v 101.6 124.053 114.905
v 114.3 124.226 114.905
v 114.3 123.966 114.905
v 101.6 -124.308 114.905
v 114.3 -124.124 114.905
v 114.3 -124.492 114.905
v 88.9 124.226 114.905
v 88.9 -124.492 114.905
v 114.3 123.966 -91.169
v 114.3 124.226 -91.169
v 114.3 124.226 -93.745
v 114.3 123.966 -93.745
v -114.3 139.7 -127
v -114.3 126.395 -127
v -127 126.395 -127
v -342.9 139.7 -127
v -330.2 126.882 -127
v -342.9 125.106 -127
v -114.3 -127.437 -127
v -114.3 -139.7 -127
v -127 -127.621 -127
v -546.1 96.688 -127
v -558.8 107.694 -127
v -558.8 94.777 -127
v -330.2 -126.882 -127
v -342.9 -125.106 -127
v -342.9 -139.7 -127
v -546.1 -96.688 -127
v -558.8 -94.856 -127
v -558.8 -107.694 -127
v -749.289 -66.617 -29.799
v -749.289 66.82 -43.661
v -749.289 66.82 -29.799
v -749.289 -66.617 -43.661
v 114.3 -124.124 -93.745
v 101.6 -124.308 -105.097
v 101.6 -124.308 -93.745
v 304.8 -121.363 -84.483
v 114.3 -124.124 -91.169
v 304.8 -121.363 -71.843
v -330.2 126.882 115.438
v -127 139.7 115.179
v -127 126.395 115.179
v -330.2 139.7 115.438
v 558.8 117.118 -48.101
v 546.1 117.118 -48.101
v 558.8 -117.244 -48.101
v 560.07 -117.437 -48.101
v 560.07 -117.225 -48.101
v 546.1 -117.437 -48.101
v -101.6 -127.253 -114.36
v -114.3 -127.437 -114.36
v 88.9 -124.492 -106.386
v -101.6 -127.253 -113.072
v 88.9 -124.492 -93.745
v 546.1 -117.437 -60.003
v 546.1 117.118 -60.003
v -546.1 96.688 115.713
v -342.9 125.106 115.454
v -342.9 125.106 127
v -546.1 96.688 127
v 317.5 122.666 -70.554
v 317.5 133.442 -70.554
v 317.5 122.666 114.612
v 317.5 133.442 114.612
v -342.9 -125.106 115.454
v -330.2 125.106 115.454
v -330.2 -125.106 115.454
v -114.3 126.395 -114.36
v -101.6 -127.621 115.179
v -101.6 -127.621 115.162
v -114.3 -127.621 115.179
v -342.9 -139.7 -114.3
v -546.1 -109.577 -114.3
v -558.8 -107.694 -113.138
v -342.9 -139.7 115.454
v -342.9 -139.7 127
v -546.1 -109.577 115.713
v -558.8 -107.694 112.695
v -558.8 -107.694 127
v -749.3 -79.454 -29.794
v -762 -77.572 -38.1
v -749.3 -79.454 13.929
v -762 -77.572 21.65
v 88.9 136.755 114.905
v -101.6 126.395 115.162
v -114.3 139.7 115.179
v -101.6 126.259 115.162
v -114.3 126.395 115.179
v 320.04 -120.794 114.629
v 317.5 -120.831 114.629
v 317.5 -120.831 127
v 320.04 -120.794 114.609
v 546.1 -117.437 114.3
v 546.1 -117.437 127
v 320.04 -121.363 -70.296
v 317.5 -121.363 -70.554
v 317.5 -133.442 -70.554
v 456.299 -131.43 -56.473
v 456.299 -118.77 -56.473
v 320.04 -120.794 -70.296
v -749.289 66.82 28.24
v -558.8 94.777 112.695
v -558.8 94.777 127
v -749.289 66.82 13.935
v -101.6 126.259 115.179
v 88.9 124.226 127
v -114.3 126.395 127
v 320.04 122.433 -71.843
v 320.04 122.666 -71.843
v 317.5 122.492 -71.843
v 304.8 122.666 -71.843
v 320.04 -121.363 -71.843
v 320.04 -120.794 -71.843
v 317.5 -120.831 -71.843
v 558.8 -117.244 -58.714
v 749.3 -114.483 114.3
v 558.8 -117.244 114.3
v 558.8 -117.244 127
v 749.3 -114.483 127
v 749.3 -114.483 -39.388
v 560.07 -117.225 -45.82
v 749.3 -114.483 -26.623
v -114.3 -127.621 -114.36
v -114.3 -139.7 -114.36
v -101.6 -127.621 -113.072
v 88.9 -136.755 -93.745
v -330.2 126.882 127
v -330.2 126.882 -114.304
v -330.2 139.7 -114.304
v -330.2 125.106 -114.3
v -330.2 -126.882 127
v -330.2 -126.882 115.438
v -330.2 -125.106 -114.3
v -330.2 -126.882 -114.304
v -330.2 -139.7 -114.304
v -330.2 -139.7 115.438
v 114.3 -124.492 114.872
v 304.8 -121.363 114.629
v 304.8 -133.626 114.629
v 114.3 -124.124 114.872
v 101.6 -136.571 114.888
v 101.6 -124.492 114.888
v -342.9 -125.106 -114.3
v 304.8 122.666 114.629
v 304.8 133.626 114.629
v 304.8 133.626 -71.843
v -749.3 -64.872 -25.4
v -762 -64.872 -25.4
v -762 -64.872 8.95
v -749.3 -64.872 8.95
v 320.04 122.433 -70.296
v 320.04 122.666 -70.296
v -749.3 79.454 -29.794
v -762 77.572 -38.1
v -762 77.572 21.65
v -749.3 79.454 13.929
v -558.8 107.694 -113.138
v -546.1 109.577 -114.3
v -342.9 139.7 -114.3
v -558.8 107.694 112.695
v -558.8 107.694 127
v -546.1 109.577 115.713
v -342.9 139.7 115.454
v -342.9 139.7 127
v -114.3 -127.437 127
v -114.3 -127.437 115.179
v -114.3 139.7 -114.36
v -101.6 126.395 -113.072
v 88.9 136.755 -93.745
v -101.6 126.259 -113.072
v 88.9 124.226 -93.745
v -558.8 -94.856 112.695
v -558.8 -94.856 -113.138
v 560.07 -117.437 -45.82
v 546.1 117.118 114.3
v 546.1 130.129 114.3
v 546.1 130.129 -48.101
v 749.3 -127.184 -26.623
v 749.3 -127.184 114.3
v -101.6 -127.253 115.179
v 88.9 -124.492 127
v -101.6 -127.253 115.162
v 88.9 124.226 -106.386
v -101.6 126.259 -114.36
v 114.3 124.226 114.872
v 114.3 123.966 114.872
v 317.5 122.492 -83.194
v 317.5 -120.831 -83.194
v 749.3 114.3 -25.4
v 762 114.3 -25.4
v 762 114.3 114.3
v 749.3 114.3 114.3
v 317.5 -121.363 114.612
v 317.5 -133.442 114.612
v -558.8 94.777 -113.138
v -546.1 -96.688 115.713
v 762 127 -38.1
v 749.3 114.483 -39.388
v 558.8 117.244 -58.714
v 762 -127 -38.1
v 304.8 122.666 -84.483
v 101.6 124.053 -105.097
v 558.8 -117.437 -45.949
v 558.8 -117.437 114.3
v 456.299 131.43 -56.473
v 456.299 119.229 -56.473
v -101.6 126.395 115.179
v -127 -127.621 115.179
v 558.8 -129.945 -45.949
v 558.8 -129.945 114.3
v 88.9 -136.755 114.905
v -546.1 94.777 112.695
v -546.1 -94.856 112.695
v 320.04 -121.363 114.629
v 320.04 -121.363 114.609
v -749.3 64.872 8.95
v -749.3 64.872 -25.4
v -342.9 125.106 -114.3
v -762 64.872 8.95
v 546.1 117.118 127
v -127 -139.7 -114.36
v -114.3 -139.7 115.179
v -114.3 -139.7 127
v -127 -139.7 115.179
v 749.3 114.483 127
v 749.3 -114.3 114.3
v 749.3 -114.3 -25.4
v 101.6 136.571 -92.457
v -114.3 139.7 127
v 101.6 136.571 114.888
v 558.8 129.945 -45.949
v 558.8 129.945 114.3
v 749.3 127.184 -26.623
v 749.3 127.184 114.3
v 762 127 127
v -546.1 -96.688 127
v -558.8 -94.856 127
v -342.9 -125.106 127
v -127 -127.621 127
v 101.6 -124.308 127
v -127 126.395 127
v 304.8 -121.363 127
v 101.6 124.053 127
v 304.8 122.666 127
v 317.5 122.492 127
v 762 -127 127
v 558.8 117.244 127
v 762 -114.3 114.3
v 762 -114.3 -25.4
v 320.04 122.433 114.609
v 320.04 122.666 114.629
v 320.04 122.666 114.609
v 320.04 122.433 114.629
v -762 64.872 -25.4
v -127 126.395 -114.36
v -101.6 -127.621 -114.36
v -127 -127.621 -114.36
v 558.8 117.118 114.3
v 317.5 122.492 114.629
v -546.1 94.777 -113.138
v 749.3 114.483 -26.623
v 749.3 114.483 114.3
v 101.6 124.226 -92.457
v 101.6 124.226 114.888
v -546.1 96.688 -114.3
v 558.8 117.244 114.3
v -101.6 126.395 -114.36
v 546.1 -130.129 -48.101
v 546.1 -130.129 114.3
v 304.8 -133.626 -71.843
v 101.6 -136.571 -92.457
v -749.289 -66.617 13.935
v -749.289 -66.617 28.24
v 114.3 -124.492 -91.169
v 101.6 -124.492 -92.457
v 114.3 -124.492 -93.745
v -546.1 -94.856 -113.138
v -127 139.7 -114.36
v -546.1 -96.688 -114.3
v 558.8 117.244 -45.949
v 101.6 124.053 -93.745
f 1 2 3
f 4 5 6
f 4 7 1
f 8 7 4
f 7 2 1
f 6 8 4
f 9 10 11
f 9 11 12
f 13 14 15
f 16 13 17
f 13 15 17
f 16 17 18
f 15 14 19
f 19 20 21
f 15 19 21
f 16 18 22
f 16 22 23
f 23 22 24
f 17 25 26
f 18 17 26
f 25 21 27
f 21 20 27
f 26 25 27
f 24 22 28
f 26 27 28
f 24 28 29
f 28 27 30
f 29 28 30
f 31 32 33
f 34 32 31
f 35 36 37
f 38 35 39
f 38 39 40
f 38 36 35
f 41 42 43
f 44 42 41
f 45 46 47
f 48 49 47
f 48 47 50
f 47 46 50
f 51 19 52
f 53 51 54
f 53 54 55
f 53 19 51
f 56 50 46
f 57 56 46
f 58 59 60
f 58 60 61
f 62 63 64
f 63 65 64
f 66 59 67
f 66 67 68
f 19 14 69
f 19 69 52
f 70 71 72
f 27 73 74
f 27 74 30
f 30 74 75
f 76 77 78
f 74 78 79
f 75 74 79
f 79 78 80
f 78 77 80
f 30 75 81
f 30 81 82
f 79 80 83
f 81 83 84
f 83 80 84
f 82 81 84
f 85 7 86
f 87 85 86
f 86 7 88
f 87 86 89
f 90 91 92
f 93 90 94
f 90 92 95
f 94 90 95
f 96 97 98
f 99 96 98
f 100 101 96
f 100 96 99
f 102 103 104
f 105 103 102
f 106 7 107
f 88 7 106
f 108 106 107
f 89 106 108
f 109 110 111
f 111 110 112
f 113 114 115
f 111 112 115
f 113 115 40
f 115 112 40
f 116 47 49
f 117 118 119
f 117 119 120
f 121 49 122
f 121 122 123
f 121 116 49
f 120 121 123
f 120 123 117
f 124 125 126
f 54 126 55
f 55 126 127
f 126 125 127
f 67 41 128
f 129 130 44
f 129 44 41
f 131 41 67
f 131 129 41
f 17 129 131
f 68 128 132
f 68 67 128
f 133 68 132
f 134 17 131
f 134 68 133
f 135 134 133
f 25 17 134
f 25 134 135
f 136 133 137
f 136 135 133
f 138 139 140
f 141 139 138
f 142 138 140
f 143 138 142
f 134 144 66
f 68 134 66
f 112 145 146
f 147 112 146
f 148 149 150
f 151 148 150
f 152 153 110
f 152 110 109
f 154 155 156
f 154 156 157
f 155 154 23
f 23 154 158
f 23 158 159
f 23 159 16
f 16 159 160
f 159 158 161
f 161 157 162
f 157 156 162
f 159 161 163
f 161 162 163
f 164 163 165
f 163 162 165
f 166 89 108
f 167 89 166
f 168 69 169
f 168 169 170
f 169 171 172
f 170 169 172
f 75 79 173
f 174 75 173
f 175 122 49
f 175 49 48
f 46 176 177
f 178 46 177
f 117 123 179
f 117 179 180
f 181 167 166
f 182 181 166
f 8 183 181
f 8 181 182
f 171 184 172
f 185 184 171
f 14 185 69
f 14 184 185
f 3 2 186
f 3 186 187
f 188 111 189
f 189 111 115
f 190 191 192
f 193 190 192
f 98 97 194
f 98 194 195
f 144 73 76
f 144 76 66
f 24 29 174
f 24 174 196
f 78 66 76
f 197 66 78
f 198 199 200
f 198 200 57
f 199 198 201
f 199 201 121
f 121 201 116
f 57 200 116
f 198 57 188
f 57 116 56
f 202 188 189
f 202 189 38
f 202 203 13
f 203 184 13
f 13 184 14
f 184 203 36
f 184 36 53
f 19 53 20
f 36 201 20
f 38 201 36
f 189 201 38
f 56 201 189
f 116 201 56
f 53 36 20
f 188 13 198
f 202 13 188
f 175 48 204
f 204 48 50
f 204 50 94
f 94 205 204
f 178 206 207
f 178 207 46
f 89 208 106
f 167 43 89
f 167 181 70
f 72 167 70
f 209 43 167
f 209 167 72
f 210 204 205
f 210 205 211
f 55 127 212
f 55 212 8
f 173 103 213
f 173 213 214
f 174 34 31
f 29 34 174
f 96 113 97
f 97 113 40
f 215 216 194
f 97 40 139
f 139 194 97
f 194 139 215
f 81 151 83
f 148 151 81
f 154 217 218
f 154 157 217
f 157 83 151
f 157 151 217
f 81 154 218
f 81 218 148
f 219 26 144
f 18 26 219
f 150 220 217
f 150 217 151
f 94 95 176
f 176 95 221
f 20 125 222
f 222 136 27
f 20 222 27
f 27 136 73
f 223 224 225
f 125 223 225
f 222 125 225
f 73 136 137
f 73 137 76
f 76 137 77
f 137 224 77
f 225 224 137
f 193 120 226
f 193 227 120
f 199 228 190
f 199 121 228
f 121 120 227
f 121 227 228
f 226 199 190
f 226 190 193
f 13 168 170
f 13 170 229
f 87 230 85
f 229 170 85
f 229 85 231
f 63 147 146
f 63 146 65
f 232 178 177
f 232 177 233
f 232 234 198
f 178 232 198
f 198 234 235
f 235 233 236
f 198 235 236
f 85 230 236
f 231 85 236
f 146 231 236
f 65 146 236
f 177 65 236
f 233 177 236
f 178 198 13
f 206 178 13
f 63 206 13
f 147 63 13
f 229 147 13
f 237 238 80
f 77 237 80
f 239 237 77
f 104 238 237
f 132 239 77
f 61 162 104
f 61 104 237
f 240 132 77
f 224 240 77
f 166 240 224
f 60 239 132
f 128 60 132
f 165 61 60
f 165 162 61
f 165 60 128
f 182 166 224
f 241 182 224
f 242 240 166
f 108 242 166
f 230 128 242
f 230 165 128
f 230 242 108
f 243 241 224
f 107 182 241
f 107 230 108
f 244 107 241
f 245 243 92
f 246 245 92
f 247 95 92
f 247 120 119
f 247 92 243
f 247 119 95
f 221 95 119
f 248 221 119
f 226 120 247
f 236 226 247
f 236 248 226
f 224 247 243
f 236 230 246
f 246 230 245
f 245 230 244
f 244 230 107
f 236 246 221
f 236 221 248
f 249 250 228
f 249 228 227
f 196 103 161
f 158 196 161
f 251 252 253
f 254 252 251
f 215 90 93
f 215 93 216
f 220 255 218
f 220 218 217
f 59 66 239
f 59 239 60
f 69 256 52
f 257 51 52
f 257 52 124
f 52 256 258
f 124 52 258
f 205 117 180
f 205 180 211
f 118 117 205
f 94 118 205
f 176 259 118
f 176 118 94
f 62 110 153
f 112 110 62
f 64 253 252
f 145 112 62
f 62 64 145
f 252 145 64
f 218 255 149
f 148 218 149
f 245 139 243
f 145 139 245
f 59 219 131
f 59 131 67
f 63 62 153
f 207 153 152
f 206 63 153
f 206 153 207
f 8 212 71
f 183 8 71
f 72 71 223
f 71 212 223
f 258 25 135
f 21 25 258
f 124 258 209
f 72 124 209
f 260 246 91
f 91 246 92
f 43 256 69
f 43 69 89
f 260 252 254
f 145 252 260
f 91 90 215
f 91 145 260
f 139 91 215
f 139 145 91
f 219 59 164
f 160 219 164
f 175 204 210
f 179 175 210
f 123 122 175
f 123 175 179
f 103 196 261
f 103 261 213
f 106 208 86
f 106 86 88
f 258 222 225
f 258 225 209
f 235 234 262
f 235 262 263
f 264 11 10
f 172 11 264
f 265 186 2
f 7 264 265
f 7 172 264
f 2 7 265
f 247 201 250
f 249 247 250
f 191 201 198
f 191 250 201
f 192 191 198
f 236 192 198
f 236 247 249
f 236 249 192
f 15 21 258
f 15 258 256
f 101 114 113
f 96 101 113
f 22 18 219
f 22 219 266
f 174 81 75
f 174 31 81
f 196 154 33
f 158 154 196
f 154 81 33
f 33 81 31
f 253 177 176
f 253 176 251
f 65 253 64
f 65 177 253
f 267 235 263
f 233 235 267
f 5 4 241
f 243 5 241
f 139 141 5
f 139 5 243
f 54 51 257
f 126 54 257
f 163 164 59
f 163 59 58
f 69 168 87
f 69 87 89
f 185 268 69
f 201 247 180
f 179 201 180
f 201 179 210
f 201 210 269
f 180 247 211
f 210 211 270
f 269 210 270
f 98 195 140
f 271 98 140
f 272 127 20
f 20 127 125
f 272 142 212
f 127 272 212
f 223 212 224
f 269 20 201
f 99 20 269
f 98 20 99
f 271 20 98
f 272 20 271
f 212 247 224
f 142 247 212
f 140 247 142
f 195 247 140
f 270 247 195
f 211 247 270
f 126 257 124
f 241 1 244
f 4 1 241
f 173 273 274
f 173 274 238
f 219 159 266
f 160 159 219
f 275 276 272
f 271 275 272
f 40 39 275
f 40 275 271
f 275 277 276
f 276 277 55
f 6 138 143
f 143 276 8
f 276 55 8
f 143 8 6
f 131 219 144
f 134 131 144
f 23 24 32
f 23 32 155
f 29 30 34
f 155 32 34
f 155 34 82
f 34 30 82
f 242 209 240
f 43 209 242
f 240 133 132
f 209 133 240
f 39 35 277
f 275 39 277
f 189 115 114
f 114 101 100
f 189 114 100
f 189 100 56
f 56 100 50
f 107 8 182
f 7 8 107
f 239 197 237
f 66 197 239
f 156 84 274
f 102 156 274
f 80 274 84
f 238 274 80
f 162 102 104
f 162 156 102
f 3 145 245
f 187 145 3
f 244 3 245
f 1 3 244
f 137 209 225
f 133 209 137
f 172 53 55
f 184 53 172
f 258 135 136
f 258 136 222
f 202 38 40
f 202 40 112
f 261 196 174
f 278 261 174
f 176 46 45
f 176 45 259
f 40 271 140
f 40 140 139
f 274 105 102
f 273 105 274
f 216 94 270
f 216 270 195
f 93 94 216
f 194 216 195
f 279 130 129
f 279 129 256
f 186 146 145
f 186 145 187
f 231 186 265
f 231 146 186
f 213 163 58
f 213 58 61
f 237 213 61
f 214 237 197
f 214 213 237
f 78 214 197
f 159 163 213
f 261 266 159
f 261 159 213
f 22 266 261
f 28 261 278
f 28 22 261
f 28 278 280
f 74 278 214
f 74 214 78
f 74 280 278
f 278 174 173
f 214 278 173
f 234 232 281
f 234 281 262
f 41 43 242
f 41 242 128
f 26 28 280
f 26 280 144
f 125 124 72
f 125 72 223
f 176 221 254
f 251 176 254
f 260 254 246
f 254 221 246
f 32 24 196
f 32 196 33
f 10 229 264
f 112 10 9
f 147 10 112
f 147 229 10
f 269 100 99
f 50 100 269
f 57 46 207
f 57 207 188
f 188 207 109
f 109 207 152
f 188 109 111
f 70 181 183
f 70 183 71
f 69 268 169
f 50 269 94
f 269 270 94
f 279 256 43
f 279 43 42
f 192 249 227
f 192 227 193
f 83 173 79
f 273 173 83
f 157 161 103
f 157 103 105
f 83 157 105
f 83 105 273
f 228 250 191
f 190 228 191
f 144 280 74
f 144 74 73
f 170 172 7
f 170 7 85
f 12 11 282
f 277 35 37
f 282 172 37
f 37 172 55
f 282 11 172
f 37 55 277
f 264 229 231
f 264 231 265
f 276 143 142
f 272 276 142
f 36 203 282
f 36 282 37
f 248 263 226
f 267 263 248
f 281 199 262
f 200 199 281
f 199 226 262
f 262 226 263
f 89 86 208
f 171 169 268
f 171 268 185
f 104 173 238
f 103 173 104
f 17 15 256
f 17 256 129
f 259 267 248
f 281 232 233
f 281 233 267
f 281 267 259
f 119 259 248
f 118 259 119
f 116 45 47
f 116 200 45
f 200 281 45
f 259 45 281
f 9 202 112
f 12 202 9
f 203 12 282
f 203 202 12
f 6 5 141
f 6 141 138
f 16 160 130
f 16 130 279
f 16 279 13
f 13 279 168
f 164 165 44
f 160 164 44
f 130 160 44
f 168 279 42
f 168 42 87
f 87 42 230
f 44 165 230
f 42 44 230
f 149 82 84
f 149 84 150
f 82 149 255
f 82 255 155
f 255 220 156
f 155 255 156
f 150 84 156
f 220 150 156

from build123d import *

# Parameters (mm, degrees)
F0_W      = 1524
F0_H      = 355.6
F2_DEPTH  = 127
F5_W      = 12.7
F5_H      = 295.684620738
F6_DEPTH  = 177.8
F8_DEPTH  = 190.5
F9_W      = 1716.6963219643
F9_H      = 471.6365635395
F10_DEPTH = 190.5
F12_DEPTH = 190.5
F13_W     = 1570.3657865524
F13_H     = 143.7467932701
F14_DEPTH = 190.5
F15_W     = 189.6323112059
F15_H     = 225.8323701404
F16_DEPTH = 25.4
F17_W     = 250.2110230158
F17_H     = 229.754279344
F18_DEPTH = 25.4
F19_W     = 254.0152243916
F19_H     = 229.5392287665
F20_DEPTH = 25.4
F21_W     = 248.717826187
F21_H     = 208.6506967284
F22_DEPTH = 25.4
F23_W     = 244.0285278141
F23_H     = 186.4718558426
F24_DEPTH = 15.24
F25_W     = 234.5546834328
F25_H     = 162.4008728846
F26_DEPTH = 13.97
F28_W     = 129.7433354616
F28_H     = 34.350046491
F29_DEPTH = 25.4
F30_W     = 228.6
F30_H     = 139.7
F31_DEPTH = 12.7


# Not quite as in the source:
# - a feature names something its author has since deleted; it is built from what else it names


with BuildPart() as f2:
    # F0 (on Top) → F2 (new body, symmetric)
    with BuildSketch(Plane.XY):
        Rectangle(F0_W, F0_H)
    extrude(amount=F2_DEPTH, both=True)

    # F5 (on Front) → F6 (join, symmetric)
    with BuildSketch(Plane.XZ):
        with Locations((-552.45, 4.7732368112)):
            Rectangle(F5_W, F5_H)
        with Locations((-336.55, 4.7732368112)):
            Rectangle(F5_W, F5_H)
        with Locations((-120.65, 4.7732368112)):
            Rectangle(F5_W, F5_H)
        with Locations((95.25, 4.7732368112)):
            Rectangle(F5_W, F5_H)
        with Locations((552.45, 4.7732368112)):
            Rectangle(F5_W, F5_H)
        with Locations((311.15, 4.7732368112)):
            Rectangle(F5_W, F5_H)
    extrude(amount=F6_DEPTH, both=True)

    # F7 (on Front) → F8 (cut, symmetric)
    with BuildSketch(Plane.XZ):
        Polygon((-1015.0121382617, 307.3465449898), (-843.425049348, -20.5651363992), (-558.8, 127), align=None)
        Polygon((-558.8, -127), (-762, -38.1), (-810.4430437088, -38.1), (-810.4430437088, -218.054279685), (819.7100162506, -218.054279685), (819.7100162506, -38.1), (762, -38.1), (-114.3, -127), align=None)
    extrude(amount=F8_DEPTH, both=True, mode=Mode.SUBTRACT)

    # F9 (on Top) → F10 (cut, symmetric)
    with BuildSketch(Plane.XY):
        with Locations((-0.0626146793, 9.3713402748)):
            Rectangle(F9_W, F9_H)
        Polygon((762, 127), (762, 0), (762, -127), (-114.3, -139.7), (-342.9, -139.7), (-762, -77.5716677308), (-762, 0), (-762, 77.5716677308), (-342.9, 139.7), (-114.3, 139.7), align=None, mode=Mode.SUBTRACT)
    extrude(amount=F10_DEPTH, both=True, mode=Mode.SUBTRACT)

    # F11 (on Top) → F12 (cut, symmetric)
    with BuildSketch(Plane.XY):
        Polygon((-749.2891273529, 66.8201254906), (-749.2891273529, -66.6171684709), (-558.8, -94.8557077165), (-558.8, 94.7766034894), align=None)
        Polygon((749.3002457909, -114.4827207254), (749.3002457909, 114.4827207254), (558.8, 117.2435938528), (558.8, -117.2435938528), align=None)
        Polygon((-127, -127.6207012333), (-127, 126.3945231583), (-330.2, 126.8815944692), (-330.2, -126.8815944692), align=None)
        Polygon((-546.1, -96.6881841261), (-342.9, -125.1055115079), (-342.9, 125.1055115079), (-546.1, 96.6881841261), align=None)
        Polygon((88.9, -124.4917157261), (88.9, 124.226110461), (-114.3, 126.3945231583), (-114.3, -127.4366432623), align=None)
        Polygon((101.6, 124.0527423648), (101.6, -124.3076577551), (304.8, -121.3627302188), (304.8, 122.6657975952), align=None)
        Polygon((317.5, 122.4924294991), (317.5, -120.8313876883), (546.1, -117.4366649156), (546.1, 117.1180185172), align=None)
    extrude(amount=F12_DEPTH, both=True, mode=Mode.SUBTRACT)

    # F13 (on Front) → F14 (cut, symmetric)
    with BuildSketch(Plane.XZ):
        Polygon((-558.8, 112.6946179402), (-749.3, 13.9290365255), (-749.3, -29.7940022002), (-558.8, -113.1377522002), align=None)
        Polygon((-546.1, -114.3), (-342.9, -114.3), (-342.9, 115.454279344), (-546.1, 115.7130942238), align=None)
        Polygon((558.8, -45.9493061315), (749.3, -26.623219175), (749.3, 114.3), (558.8, 114.3), align=None)
        Polygon((-330.2, -114.303525896), (-127, -114.3599402323), (-127, 115.1792885342), (-330.2, 115.438103414), align=None)
        Polygon((304.8, 114.6293069146), (101.6, 114.8881217944), (101.6, -92.4570416816), (304.8, -71.842548928), align=None)
        Polygon((456.2991908124, -56.4730658021), (546.1, -48.1008728846), (546.1, 114.3), (317.5, 114.6119749718), (317.5, -70.5541431309), align=None)
        with Locations((66.4489865303, 198.8733966351)):
            Rectangle(F13_W, F13_H)
        Polygon((-114.3, 115.1792885342), (-114.3, -114.3599402323), (88.9, -93.7454474787), (88.9, 114.9052492497), align=None)
    extrude(amount=F14_DEPTH, both=True, mode=Mode.SUBTRACT)

    # F15 (on face) → F16 (cut)
    with BuildSketch(Plane(origin=(-558.8, 0, 0), x_dir=(0, -1, 0), z_dir=(-1, 0, 0))):
        with Locations((0.0395521135, -0.22156713)):
            Rectangle(F15_W, F15_H)
    extrude(amount=-F16_DEPTH, mode=Mode.SUBTRACT)

    # F17 (on face) → F18 (cut)
    with BuildSketch(Plane(origin=(-342.9, 0, 0), x_dir=(0, -1, 0), z_dir=(-1, 0, 0))):
        with Locations((0, 0.577139672)):
            Rectangle(F17_W, F17_H)
    extrude(amount=-F18_DEPTH, mode=Mode.SUBTRACT)

    # F19 (on face) → F20 (cut)
    with BuildSketch(Plane(origin=(-127, 0, 0), x_dir=(0, -1, 0), z_dir=(-1, 0, 0))):
        with Locations((0.6130890375, 0.4096741509)):
            Rectangle(F19_W, F19_H)
    extrude(amount=-F20_DEPTH, mode=Mode.SUBTRACT)

    # F21 (on face) → F22 (cut)
    with BuildSketch(Plane(origin=(88.9, 0, 0), x_dir=(0, -1, 0), z_dir=(-1, 0, 0))):
        with Locations((0.1328026326, 10.5799008855)):
            Rectangle(F21_W, F21_H)
    extrude(amount=-F22_DEPTH, mode=Mode.SUBTRACT)

    # F23 (on face) → F24 (cut)
    with BuildSketch(Plane(origin=(304.8, 0, 0), x_dir=(0, -1, 0), z_dir=(-1, 0, 0))):
        with Locations((-0.6515336882, 21.3933789933)):
            Rectangle(F23_W, F23_H)
    extrude(amount=-F24_DEPTH, mode=Mode.SUBTRACT)

    # F25 (on face) → F26 (cut)
    with BuildSketch(Plane(origin=(546.1, 0, 0), x_dir=(0, -1, 0), z_dir=(-1, 0, 0))):
        with Locations((0.1593231992, 33.0995635577)):
            Rectangle(F25_W, F25_H)
    extrude(amount=-F26_DEPTH, mode=Mode.SUBTRACT)

    # F28 (on face) → F29 (cut)
    with BuildSketch(Plane(origin=(-762, 0, 0), x_dir=(0, -1, 0), z_dir=(-1, 0, 0))):
        with Locations((0, -8.2249767545)):
            Rectangle(F28_W, F28_H)
    extrude(amount=-F29_DEPTH, mode=Mode.SUBTRACT)

    # F30 (on face) → F31 (cut)
    with BuildSketch(Plane.YZ.offset(762)):
        with Locations((0, 44.45)):
            Rectangle(F30_W, F30_H)
    extrude(amount=-F31_DEPTH, mode=Mode.SUBTRACT)


solid = f2.part
